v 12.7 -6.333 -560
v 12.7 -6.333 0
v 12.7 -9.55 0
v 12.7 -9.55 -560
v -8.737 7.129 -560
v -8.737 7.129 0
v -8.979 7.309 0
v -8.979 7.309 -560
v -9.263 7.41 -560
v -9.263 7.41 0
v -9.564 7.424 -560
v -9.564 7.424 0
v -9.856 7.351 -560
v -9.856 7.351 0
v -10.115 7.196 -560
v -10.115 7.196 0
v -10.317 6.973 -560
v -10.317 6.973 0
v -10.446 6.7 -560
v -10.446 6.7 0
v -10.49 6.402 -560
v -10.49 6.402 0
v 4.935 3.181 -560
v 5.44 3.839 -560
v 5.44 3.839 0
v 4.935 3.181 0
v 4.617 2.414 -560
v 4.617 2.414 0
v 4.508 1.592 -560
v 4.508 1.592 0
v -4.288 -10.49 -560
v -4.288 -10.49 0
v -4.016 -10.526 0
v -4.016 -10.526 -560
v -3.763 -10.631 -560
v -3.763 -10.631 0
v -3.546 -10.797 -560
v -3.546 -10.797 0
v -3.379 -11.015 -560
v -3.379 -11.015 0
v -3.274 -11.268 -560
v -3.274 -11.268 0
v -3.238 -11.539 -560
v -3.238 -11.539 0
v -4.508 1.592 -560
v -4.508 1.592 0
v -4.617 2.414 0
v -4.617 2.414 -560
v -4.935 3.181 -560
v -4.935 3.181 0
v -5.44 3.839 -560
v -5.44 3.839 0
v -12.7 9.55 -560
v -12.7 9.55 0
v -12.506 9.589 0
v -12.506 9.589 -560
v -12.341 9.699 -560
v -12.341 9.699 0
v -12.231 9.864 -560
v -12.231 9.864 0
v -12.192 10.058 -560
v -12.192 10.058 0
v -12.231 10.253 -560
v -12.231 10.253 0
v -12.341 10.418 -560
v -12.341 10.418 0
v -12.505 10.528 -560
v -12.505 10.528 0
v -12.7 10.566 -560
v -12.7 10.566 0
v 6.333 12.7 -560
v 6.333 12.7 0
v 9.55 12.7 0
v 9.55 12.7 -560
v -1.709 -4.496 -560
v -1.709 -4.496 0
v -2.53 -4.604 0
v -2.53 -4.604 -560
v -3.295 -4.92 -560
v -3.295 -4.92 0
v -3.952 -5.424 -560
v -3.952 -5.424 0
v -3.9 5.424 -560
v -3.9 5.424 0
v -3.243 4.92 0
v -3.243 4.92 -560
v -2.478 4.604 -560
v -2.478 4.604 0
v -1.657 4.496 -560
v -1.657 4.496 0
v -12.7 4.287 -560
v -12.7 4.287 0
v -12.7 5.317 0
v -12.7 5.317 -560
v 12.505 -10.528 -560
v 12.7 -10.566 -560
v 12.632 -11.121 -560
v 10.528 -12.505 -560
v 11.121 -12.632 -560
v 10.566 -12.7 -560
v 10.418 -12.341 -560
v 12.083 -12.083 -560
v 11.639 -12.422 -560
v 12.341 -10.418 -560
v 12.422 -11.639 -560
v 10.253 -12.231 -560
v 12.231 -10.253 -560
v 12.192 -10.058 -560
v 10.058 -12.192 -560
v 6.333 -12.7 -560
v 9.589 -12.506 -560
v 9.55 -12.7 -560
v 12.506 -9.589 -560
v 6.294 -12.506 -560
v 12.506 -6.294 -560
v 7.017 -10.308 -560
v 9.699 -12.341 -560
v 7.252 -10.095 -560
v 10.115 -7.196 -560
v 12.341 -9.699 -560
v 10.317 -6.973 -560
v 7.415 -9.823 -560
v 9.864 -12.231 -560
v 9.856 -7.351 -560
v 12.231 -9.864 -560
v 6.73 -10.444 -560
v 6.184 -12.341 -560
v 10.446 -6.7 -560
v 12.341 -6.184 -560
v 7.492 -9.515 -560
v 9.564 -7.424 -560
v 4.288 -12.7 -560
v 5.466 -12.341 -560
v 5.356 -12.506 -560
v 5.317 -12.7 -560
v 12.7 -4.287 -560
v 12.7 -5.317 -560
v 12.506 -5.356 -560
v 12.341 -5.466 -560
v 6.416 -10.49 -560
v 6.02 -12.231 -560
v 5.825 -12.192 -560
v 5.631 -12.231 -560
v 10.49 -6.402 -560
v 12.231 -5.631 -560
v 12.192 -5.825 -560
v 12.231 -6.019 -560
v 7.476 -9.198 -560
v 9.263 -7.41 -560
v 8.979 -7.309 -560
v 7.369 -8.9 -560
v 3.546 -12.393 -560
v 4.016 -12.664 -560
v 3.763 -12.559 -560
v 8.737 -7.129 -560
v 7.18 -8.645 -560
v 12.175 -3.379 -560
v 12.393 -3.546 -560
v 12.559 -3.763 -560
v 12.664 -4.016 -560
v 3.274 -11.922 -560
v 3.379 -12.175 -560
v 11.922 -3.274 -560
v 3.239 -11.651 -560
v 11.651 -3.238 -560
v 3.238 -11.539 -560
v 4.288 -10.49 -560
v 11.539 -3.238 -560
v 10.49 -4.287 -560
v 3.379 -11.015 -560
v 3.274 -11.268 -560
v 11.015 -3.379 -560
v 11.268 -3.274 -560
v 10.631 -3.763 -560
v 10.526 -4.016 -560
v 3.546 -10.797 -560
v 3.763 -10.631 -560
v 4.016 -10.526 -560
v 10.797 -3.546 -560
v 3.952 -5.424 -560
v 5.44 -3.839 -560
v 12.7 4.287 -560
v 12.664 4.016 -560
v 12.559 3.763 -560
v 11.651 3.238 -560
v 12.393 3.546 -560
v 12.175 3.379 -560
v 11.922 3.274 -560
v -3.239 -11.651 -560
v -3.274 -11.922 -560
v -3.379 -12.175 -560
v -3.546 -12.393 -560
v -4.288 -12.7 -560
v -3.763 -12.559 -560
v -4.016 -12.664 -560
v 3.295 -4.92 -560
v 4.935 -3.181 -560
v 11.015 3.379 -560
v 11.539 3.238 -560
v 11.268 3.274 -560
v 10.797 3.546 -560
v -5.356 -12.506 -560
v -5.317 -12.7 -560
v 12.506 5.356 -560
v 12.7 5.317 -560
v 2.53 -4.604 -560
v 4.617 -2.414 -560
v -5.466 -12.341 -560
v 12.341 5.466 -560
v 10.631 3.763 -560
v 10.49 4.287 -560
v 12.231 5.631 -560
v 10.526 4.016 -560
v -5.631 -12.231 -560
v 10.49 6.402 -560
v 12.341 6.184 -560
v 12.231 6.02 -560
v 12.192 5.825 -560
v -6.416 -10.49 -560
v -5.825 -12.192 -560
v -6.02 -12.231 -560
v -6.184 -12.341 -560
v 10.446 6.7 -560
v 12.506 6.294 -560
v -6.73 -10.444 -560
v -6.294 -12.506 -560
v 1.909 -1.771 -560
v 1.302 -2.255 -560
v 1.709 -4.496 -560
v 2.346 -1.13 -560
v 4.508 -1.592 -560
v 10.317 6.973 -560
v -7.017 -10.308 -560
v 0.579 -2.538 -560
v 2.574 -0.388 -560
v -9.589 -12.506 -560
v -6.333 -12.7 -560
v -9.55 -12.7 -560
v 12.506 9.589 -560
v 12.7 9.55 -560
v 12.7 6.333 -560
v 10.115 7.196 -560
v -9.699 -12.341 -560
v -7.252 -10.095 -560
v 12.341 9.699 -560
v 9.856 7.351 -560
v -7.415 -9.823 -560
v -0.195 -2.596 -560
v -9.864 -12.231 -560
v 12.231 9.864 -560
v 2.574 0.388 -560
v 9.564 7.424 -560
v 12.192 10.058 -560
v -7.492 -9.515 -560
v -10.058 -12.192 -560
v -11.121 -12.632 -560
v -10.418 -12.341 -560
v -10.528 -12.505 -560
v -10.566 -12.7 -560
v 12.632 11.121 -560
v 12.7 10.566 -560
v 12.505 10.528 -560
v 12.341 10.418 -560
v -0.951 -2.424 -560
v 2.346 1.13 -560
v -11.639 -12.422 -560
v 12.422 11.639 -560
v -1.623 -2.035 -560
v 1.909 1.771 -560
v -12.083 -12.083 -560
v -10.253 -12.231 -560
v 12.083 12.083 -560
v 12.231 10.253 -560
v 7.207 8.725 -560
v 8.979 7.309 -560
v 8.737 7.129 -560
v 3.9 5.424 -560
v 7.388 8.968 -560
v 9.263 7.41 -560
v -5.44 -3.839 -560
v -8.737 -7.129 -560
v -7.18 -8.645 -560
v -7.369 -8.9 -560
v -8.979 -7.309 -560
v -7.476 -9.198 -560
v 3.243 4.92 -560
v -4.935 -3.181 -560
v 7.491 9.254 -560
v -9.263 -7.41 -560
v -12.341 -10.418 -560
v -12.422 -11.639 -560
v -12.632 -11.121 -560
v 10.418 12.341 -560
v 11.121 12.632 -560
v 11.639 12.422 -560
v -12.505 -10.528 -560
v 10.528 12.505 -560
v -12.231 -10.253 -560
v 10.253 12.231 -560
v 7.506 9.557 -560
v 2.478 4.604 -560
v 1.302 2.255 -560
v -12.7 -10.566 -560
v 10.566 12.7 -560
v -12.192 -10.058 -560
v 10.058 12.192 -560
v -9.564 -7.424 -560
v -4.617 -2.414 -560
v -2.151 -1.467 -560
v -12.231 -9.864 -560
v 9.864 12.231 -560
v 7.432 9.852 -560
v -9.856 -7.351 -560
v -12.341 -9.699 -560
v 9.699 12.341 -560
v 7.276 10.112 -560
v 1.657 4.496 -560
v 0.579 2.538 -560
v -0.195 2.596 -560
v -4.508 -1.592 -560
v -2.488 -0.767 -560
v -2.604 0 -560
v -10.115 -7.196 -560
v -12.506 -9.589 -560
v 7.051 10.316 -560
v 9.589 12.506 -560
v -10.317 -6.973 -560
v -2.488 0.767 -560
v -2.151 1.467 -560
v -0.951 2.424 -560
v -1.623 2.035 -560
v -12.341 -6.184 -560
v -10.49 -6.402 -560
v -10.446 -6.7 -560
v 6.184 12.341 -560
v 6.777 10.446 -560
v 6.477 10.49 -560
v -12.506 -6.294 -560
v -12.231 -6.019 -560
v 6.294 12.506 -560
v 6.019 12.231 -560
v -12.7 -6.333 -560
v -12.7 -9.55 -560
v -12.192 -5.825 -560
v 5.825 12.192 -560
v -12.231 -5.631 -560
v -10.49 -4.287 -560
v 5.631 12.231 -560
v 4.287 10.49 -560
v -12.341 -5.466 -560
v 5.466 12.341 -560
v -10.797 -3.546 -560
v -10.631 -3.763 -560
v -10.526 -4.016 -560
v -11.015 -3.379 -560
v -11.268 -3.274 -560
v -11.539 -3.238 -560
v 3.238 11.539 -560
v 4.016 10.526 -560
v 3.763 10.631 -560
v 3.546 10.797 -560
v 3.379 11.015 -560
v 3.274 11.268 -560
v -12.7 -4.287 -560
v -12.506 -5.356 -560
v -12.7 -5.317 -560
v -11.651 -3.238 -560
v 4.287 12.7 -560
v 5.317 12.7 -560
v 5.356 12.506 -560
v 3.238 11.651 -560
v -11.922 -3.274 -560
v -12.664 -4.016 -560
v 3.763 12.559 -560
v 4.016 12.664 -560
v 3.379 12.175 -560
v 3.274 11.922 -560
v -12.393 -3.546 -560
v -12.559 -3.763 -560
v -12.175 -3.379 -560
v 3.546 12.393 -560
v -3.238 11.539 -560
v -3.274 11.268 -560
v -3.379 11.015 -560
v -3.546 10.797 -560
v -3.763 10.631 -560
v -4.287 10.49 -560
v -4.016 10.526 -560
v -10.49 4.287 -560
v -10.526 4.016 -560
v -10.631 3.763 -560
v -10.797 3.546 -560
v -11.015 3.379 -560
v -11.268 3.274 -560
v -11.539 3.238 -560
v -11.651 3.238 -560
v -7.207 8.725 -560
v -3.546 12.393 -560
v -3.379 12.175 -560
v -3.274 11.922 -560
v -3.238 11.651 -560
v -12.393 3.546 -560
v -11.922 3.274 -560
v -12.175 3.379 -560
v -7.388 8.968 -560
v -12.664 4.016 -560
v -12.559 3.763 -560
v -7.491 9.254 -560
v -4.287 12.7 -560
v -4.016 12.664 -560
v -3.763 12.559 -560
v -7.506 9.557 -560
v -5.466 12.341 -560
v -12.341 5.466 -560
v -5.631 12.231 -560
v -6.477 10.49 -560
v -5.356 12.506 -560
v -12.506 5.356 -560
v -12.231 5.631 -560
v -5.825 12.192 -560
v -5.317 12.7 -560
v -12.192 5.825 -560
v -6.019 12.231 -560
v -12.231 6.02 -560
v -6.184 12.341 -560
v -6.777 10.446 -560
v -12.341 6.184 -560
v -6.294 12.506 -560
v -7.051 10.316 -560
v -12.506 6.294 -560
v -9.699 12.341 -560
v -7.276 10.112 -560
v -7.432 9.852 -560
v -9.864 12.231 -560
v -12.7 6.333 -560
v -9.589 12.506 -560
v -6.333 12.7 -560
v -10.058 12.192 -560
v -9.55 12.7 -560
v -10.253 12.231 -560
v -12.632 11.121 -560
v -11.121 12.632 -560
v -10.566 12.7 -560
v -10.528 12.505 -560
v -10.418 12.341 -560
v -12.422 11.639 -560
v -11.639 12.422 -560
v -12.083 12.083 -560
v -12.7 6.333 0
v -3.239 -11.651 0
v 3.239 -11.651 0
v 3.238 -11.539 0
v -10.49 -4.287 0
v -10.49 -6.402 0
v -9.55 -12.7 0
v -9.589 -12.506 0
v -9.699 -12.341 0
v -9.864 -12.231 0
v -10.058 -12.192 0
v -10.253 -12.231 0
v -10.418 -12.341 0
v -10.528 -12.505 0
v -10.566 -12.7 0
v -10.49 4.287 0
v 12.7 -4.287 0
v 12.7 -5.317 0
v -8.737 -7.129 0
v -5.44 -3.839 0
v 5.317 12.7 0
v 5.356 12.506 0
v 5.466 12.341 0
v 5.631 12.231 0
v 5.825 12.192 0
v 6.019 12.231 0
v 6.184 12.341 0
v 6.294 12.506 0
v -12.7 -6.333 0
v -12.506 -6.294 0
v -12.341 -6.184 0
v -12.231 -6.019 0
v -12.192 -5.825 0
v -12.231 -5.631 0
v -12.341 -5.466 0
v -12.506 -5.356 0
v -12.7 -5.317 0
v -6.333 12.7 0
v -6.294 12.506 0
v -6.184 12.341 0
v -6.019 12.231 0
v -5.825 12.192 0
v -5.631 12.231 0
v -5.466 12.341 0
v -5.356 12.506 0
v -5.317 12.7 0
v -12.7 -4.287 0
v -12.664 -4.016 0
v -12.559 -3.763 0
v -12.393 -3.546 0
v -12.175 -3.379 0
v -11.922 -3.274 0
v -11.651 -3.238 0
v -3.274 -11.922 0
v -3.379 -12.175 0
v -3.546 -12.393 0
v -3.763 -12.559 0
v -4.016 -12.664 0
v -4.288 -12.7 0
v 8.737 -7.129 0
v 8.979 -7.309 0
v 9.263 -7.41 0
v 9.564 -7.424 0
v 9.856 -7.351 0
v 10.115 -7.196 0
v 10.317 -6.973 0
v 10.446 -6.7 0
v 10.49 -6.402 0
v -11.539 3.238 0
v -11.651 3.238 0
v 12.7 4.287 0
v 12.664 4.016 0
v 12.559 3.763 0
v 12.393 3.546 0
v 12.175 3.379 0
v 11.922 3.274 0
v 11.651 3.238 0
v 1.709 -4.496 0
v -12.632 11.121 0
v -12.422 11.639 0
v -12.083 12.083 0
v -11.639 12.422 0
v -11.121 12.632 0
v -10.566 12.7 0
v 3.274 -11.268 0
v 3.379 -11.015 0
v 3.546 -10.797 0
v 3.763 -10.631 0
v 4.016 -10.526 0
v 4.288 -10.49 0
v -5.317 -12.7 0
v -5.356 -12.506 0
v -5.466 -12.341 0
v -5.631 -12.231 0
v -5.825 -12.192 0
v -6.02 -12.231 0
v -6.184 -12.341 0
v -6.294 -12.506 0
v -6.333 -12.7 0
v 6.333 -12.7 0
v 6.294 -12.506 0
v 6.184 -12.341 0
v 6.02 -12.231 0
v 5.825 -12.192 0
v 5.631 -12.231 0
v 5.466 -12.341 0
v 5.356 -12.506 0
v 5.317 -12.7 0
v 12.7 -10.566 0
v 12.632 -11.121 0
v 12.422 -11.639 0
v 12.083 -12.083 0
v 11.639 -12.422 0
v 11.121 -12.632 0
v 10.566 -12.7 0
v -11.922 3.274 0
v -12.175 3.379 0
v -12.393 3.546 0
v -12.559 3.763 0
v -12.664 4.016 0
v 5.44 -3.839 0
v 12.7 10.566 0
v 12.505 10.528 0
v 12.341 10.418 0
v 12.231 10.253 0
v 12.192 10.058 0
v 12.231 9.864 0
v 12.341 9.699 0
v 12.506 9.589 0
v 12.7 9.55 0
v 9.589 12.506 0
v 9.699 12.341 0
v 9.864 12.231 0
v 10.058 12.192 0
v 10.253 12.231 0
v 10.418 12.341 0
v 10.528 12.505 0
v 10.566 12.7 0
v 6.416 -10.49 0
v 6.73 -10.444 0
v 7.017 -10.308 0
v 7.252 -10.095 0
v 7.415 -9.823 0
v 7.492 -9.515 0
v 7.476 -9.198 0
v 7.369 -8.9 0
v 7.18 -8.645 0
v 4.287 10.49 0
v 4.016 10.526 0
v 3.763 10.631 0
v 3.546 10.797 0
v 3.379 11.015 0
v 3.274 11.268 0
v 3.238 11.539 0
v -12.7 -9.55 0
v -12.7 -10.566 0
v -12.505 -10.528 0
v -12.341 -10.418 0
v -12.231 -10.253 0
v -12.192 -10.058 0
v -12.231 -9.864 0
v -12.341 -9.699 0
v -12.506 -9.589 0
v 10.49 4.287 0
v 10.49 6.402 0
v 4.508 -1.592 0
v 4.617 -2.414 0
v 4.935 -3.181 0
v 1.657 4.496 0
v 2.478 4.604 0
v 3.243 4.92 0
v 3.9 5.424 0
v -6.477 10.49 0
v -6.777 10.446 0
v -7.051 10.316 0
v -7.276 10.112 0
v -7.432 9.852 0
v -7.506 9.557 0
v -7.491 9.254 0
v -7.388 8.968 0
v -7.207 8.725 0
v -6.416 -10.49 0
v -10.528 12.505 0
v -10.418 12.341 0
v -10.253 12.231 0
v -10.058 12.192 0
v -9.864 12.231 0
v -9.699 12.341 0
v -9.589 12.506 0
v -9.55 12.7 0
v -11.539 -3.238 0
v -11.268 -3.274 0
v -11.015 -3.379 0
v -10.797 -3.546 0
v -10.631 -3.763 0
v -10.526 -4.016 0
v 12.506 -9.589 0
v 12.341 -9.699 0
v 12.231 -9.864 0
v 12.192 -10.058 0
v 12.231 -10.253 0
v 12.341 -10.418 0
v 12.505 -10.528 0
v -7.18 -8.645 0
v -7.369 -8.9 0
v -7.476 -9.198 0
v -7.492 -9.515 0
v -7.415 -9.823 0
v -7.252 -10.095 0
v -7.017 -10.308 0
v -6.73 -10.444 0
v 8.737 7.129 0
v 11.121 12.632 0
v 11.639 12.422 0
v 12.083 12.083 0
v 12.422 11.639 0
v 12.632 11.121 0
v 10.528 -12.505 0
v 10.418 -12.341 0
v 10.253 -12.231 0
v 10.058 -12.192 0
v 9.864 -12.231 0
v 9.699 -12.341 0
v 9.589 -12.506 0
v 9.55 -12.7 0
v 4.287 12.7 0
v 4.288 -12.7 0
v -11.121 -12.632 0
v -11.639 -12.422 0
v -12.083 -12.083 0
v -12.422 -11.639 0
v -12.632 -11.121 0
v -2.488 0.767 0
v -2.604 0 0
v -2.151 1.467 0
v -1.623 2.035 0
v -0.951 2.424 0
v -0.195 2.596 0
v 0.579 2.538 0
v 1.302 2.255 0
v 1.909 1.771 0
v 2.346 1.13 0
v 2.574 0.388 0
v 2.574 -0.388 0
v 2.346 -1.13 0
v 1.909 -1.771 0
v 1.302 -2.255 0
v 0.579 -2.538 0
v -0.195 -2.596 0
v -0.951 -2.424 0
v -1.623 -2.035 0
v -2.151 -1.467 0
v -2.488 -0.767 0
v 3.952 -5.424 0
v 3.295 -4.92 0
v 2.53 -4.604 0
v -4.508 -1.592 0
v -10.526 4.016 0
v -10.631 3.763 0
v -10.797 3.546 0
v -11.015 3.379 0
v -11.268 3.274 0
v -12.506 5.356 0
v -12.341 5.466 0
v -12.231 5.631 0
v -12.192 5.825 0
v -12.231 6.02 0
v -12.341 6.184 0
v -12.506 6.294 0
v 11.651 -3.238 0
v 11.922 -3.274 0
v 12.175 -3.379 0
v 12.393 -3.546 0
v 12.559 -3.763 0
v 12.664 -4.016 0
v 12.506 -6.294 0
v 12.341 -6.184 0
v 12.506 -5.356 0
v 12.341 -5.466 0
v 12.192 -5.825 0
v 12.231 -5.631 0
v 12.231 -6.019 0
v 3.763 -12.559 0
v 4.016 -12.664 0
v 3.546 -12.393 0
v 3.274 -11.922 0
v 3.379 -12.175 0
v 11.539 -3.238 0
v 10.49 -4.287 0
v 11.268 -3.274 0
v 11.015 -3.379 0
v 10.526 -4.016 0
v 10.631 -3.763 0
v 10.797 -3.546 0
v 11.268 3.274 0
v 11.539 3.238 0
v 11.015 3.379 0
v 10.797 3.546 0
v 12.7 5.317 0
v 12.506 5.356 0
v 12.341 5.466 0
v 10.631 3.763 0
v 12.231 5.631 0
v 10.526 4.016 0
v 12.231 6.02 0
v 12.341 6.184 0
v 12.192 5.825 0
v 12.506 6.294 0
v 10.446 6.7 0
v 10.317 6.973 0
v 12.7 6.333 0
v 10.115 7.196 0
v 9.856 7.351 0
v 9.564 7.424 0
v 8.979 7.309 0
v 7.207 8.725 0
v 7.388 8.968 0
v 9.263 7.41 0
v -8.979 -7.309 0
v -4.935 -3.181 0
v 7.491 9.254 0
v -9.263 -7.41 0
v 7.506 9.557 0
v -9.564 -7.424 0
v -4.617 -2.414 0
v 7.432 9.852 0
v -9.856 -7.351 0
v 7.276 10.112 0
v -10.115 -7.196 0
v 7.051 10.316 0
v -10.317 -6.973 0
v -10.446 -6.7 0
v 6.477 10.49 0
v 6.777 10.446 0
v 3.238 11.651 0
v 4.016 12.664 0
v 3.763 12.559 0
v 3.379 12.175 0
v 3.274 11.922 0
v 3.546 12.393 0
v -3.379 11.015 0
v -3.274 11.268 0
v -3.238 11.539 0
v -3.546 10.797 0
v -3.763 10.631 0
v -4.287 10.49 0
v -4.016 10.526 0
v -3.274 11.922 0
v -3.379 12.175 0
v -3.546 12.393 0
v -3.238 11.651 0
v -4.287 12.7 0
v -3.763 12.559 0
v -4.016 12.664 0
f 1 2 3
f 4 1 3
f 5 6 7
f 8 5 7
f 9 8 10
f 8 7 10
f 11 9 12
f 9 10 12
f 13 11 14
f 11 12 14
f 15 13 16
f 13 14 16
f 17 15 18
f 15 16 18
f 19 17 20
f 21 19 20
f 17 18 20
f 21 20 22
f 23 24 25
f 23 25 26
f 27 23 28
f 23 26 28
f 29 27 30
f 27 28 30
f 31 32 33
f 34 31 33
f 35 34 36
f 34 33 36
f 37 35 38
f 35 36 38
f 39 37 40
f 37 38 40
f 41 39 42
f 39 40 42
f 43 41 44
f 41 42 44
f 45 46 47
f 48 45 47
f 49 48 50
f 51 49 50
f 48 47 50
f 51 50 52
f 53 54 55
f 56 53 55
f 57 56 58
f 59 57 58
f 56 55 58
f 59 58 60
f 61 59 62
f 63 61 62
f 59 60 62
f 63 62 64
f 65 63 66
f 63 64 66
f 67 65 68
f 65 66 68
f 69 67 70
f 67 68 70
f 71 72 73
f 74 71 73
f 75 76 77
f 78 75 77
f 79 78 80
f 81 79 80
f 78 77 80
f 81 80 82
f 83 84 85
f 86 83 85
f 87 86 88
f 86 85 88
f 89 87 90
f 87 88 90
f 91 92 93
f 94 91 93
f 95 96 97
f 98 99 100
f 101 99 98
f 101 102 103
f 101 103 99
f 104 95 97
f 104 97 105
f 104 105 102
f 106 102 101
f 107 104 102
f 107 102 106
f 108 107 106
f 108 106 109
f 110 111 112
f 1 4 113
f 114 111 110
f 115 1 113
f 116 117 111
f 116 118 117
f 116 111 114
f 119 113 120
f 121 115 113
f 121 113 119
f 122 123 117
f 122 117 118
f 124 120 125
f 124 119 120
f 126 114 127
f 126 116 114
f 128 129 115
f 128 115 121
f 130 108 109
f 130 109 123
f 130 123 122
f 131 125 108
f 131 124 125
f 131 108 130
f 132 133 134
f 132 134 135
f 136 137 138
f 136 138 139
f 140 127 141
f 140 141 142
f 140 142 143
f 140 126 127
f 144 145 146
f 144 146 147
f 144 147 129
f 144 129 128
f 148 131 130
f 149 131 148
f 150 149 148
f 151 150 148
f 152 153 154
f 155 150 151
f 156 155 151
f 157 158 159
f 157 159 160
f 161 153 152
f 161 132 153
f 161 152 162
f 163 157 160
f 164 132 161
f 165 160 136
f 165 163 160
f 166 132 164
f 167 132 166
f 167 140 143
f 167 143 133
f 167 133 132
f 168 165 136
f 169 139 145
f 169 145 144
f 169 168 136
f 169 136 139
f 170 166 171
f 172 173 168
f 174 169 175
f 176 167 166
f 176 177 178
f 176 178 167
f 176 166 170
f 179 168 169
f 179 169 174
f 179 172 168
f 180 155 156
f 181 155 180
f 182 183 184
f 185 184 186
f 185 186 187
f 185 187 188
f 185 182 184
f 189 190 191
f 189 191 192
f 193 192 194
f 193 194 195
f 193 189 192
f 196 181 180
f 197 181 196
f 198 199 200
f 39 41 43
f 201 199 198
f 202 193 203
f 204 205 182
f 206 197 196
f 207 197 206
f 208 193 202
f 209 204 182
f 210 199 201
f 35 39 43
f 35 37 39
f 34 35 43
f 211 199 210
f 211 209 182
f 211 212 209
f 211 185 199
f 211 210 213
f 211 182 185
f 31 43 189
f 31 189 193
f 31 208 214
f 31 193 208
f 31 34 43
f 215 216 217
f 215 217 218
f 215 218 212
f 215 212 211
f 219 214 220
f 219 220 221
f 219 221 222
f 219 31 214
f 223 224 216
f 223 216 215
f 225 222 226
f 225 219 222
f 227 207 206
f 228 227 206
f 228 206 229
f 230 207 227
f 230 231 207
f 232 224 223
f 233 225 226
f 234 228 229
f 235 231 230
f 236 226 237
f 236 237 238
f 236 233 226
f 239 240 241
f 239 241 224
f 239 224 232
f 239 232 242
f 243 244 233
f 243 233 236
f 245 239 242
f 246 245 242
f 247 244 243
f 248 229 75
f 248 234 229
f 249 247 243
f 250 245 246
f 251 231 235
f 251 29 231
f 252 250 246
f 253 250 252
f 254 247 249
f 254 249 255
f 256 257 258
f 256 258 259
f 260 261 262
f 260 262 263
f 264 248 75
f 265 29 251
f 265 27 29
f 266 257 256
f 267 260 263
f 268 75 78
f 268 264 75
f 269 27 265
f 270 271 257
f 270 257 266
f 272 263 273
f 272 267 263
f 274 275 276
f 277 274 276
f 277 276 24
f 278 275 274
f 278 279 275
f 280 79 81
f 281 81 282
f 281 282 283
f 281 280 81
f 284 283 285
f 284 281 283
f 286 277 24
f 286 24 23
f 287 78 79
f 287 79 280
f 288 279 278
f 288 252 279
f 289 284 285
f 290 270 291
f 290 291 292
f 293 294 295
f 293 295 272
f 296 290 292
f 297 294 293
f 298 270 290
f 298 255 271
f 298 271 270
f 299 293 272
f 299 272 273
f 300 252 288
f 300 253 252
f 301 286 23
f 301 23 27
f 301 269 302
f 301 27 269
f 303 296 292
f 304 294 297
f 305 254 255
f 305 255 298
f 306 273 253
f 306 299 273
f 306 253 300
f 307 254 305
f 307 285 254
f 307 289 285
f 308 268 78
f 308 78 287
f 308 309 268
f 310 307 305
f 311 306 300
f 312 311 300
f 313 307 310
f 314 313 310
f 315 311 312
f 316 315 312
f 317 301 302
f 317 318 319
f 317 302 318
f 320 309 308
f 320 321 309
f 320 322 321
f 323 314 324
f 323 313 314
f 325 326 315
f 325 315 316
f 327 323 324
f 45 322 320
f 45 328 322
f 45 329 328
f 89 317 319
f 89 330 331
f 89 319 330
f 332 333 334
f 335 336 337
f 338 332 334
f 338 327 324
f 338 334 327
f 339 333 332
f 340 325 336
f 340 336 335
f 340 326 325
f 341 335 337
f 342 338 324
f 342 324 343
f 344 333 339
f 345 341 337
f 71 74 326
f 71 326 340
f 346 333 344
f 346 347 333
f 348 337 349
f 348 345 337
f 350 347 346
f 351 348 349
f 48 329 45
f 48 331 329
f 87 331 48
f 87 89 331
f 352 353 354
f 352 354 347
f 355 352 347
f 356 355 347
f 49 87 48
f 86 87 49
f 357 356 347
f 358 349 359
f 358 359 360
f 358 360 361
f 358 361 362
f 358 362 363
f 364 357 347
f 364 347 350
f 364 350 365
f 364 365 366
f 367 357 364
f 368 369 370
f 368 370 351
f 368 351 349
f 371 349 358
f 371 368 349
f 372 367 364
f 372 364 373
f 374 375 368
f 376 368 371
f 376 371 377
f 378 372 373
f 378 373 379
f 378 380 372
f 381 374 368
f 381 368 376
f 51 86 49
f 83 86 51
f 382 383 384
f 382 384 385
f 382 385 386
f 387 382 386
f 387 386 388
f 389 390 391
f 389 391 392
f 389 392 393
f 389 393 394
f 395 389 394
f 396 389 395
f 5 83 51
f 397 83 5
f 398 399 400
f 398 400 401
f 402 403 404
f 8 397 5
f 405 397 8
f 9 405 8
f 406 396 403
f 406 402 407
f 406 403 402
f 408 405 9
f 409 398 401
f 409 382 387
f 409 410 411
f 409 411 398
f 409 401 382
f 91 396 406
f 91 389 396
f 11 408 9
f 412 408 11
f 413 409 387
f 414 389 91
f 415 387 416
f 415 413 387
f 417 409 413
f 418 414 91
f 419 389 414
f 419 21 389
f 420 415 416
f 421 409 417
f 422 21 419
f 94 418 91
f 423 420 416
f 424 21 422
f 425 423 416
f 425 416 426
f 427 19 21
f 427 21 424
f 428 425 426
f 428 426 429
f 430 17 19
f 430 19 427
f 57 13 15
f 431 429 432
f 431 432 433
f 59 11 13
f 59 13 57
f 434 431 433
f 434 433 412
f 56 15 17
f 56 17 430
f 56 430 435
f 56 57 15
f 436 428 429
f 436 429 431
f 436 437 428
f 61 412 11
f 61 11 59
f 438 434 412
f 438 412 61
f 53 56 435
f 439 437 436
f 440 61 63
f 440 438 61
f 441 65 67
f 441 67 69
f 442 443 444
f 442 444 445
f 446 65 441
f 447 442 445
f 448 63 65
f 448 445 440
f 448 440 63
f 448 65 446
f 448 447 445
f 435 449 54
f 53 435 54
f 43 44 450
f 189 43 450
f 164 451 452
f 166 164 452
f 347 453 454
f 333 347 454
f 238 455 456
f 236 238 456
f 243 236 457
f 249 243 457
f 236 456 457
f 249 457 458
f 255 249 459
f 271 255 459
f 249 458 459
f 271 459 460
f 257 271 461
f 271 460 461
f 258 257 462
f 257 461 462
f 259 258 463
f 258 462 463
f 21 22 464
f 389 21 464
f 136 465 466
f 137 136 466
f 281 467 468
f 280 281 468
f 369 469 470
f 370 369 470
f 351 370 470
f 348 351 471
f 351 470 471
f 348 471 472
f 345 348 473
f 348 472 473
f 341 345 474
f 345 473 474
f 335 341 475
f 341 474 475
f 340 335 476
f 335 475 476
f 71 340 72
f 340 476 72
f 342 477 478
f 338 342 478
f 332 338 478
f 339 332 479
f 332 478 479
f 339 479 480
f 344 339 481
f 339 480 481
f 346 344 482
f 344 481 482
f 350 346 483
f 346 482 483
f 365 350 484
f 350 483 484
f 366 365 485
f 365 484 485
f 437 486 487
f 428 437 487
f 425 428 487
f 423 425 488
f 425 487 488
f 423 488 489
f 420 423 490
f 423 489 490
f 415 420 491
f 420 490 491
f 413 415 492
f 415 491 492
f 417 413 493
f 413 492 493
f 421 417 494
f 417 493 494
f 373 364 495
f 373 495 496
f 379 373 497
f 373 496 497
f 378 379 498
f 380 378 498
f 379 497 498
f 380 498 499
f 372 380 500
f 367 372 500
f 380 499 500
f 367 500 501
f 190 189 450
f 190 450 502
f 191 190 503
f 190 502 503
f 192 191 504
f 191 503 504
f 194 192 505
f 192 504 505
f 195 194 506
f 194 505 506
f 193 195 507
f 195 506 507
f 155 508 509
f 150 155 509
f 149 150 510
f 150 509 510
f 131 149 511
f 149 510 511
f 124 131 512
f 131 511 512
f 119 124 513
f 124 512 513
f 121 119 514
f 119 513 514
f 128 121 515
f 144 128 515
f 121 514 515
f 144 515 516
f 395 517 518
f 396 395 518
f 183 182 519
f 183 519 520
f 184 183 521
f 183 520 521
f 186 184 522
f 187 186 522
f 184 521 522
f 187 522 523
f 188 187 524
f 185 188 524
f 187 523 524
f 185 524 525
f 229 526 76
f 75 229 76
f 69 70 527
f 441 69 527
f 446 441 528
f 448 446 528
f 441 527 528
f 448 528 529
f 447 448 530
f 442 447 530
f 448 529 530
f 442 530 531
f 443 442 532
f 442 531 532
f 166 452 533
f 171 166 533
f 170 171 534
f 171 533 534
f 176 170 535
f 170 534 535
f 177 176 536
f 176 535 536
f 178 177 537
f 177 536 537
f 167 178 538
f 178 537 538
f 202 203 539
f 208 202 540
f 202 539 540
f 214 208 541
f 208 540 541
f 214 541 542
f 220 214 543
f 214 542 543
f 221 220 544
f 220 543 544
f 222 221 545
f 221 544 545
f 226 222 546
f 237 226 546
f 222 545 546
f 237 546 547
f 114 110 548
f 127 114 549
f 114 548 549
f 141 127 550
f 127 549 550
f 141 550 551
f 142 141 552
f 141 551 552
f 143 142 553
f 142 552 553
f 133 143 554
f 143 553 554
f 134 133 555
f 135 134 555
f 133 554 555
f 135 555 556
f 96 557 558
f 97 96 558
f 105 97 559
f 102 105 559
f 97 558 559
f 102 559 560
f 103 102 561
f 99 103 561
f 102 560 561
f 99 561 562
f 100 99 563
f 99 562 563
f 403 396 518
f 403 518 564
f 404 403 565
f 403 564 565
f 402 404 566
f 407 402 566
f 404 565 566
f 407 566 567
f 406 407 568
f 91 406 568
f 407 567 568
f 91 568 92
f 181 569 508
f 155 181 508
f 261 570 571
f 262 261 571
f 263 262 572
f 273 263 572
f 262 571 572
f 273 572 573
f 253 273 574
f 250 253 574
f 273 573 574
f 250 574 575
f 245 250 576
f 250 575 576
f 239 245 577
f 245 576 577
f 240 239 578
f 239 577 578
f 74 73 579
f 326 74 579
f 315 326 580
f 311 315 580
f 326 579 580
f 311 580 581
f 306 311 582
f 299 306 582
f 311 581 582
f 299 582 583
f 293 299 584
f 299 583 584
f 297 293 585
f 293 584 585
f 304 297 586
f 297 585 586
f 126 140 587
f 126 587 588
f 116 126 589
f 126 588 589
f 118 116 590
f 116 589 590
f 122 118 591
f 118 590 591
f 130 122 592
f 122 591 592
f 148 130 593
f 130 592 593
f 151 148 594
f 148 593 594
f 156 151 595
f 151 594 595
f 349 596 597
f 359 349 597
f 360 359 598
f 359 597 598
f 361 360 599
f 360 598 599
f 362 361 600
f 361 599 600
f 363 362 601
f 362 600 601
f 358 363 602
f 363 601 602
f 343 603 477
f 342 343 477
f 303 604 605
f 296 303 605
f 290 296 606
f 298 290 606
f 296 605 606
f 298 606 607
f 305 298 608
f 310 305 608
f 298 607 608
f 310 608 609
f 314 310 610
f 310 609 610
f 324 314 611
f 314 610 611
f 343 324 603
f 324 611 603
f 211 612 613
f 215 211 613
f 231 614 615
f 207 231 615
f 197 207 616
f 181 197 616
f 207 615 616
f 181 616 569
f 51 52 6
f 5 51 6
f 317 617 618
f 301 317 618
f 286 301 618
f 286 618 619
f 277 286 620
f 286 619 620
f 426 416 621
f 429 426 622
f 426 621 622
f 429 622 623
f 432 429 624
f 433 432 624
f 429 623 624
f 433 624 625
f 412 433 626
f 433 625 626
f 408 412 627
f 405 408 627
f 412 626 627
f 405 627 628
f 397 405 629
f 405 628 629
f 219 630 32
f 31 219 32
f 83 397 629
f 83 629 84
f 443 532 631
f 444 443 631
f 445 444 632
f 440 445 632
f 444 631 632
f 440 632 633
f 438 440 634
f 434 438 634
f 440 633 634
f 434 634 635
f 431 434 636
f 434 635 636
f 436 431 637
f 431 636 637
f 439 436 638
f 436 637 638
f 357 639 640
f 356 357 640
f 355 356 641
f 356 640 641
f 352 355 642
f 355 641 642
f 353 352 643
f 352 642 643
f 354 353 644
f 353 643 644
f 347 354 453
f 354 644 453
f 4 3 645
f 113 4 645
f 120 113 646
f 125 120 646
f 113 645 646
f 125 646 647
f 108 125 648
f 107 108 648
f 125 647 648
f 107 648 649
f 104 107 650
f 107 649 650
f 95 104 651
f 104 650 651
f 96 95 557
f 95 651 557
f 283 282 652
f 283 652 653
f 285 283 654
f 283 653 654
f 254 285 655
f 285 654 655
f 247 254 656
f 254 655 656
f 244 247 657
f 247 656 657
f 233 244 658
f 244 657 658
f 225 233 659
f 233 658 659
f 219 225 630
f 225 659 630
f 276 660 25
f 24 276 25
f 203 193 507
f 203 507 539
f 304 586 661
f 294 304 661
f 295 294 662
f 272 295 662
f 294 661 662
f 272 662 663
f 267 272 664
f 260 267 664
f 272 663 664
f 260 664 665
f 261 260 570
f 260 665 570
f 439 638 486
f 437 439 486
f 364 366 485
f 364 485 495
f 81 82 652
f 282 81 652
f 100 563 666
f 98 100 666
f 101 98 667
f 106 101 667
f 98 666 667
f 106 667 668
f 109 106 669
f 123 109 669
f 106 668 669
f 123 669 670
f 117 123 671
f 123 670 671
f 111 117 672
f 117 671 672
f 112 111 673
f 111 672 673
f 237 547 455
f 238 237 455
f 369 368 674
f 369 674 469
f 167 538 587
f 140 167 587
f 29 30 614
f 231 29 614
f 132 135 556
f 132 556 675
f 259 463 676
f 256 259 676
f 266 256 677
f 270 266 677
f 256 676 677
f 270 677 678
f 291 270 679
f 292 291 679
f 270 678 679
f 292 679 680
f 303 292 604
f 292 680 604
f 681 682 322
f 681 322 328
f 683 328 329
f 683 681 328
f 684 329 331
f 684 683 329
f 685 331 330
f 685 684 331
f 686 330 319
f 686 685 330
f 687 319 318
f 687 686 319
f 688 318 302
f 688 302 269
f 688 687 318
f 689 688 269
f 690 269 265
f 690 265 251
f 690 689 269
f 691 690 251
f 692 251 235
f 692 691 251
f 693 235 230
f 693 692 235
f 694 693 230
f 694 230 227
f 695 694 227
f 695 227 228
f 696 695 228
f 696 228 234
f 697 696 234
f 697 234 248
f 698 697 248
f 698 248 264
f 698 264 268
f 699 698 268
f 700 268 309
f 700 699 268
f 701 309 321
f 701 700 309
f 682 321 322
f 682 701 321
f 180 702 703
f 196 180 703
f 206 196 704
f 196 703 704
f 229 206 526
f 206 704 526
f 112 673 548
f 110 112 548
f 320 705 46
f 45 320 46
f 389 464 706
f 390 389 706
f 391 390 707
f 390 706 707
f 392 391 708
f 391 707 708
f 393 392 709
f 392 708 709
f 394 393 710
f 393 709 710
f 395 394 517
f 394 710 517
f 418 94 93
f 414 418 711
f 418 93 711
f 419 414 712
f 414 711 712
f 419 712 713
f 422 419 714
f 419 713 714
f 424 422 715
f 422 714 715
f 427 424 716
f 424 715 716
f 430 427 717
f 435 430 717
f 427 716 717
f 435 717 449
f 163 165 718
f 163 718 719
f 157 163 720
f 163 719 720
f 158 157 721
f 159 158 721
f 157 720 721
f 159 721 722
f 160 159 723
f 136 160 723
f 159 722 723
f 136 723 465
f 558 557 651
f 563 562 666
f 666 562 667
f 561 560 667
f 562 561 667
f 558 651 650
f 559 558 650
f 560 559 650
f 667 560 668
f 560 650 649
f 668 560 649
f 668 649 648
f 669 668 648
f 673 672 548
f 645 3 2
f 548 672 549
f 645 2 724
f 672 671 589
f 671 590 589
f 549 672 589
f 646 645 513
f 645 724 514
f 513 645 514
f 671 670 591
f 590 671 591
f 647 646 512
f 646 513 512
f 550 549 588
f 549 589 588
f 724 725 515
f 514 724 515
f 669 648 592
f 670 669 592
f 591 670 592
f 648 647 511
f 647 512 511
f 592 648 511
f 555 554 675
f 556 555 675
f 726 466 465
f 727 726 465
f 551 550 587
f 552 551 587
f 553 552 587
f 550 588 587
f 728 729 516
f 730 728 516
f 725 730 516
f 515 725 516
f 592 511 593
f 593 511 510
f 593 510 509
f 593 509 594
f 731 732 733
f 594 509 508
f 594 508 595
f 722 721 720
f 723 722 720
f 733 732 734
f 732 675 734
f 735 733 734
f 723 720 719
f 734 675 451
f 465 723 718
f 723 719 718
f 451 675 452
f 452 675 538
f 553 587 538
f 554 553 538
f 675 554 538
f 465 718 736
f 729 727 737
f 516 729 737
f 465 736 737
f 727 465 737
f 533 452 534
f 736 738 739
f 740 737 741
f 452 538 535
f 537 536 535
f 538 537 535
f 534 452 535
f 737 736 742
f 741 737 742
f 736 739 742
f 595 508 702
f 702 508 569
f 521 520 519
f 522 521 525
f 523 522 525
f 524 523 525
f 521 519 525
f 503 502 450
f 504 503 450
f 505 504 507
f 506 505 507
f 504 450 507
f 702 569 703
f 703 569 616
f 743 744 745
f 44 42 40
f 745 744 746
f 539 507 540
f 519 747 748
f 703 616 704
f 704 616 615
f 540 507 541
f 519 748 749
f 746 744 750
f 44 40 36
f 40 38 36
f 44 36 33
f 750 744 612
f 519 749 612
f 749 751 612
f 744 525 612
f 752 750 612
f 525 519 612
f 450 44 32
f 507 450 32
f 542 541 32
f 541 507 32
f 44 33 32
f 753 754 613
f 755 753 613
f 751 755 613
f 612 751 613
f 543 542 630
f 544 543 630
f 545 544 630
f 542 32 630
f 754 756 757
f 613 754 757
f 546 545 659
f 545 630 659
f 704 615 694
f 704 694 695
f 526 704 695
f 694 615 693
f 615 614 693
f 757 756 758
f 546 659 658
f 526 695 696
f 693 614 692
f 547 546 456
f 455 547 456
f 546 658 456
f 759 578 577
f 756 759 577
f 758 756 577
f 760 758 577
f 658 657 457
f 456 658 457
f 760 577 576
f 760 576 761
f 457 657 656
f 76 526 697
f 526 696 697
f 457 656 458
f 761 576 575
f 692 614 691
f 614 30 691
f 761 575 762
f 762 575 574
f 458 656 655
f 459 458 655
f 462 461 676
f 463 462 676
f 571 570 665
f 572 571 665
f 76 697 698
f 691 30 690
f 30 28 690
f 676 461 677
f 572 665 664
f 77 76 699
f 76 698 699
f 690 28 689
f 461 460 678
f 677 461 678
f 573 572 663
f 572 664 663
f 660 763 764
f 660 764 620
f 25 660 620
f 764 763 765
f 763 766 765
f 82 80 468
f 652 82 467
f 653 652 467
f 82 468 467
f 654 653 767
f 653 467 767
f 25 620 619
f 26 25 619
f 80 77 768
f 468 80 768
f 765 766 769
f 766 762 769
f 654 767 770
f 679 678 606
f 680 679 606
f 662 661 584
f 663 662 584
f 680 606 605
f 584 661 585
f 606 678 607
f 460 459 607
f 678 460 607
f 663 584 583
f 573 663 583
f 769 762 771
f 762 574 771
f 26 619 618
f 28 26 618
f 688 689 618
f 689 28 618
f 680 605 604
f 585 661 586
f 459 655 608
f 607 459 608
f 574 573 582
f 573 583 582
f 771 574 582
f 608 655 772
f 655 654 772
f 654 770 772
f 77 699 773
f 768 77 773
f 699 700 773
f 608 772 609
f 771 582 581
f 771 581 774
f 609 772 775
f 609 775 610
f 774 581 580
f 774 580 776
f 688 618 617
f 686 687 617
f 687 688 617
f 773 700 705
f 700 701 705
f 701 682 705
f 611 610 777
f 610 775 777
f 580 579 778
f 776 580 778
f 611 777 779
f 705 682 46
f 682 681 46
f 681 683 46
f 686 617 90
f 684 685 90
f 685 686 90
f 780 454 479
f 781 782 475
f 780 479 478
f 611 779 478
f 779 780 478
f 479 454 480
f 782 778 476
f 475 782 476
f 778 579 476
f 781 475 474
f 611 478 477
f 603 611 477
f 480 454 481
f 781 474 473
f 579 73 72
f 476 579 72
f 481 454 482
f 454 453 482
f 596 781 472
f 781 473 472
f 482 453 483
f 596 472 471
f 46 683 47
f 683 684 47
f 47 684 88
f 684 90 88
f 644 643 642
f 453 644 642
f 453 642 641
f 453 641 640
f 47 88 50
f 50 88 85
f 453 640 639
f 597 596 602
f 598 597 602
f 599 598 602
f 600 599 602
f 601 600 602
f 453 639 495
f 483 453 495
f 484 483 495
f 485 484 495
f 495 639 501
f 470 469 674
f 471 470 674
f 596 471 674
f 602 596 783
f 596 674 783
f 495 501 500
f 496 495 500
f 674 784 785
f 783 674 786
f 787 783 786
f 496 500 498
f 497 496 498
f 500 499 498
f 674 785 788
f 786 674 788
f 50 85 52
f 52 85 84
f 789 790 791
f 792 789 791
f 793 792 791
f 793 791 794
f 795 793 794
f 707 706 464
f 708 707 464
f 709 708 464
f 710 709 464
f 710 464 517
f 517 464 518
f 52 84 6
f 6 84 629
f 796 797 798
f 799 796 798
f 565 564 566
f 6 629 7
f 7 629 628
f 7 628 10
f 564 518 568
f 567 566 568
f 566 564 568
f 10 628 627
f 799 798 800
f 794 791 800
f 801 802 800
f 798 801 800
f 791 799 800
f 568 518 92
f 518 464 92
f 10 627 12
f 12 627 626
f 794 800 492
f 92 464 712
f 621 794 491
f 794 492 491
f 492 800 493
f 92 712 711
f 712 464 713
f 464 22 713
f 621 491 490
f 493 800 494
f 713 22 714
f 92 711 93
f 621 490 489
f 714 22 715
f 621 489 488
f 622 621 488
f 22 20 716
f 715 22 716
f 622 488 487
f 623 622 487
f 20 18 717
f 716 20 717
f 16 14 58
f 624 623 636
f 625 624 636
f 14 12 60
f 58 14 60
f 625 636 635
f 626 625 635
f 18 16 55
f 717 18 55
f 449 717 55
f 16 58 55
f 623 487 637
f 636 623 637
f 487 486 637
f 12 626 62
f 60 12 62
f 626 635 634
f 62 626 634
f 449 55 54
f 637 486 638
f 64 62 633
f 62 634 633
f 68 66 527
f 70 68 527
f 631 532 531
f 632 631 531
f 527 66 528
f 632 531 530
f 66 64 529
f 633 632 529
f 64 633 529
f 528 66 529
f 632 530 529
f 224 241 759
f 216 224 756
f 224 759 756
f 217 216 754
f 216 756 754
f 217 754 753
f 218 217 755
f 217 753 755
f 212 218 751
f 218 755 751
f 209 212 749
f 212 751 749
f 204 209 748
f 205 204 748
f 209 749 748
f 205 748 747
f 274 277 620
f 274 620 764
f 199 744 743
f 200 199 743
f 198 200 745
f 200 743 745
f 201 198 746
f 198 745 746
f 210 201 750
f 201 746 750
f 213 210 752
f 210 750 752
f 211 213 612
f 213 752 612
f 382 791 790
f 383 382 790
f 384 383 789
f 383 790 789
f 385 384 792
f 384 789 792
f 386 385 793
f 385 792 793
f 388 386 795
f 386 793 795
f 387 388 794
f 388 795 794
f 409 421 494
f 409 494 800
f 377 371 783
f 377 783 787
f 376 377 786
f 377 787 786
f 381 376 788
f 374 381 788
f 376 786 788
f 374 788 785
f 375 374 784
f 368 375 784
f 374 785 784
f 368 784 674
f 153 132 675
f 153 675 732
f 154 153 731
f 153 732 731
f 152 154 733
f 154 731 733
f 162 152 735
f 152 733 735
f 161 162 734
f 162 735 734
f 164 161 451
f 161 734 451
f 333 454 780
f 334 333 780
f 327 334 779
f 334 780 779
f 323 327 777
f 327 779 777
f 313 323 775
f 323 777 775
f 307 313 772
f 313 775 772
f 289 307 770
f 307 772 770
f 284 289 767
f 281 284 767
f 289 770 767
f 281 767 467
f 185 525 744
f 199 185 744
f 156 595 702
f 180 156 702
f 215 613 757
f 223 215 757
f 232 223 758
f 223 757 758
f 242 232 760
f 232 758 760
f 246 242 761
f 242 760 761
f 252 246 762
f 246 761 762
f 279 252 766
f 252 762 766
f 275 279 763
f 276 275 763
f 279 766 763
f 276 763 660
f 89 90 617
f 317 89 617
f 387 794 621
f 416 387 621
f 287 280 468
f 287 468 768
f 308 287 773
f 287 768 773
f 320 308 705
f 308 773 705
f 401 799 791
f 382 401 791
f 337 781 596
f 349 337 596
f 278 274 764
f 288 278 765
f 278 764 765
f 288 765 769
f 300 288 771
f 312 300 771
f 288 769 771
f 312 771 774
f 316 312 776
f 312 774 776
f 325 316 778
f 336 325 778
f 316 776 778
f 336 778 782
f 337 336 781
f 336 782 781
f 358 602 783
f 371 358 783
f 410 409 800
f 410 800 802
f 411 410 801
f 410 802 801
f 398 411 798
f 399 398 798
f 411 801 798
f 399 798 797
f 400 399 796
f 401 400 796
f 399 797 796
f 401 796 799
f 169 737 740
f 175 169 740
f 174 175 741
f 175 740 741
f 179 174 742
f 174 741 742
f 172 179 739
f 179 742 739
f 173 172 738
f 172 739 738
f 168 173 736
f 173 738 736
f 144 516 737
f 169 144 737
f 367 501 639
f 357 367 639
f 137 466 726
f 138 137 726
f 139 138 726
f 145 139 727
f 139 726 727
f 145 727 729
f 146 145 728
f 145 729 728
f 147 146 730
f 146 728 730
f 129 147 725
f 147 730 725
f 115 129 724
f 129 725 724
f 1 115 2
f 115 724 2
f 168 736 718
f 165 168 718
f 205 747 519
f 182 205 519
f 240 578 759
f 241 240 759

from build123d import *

# Parameters (mm, degrees)
SKETCH16_R                                 = 2.6035
IMPERIAL_AL_EXTRUSION_1010_PROFILE_1_DEPTH = 560


with BuildPart() as part:
    # Sketch16 → Imperial al extrusion 1010 PROFILE(1) (new body)
    with BuildSketch(Plane(origin=(0, 0, 0), x_dir=(-1, 0, 0), z_dir=(0, 0, -1))):
        with BuildLine():
            Line((-1.709253557, -4.4958), (1.709253557, -4.4958))
            ThreePointArc((1.709253557, -4.4958), (2.922935876, -4.736928798), (3.95226937, -5.423689619))
            Line((3.95226937, -5.423689619), (7.179652728, -8.645192207))
            ThreePointArc((7.179652728, -8.645192207), (7.414733441, -9.822812921), (6.41641086, -10.4902))
            Line((6.41641086, -10.4902), (4.28752, -10.4902))
            ThreePointArc((4.28752, -10.4902), (3.545750844, -10.797450844), (3.2385, -11.53922))
            Line((3.2385, -11.53922), (3.2385, -11.65098))
            ThreePointArc((3.2385, -11.65098), (3.545750844, -12.392749156), (4.28752, -12.7))
            Line((4.28752, -12.7), (5.3171344, -12.7))
            ThreePointArc((5.3171344, -12.7), (5.8251344, -12.192), (6.3331344, -12.7))
            Line((6.3331344, -12.7), (9.5504, -12.7))
            ThreePointArc((9.5504, -12.7), (10.058323491, -12.192000006), (10.566399977, -12.699846982))
            ThreePointArc((10.566399977, -12.699846982), (12.082522516, -12.082522516), (12.699846982, -10.566399977))
            ThreePointArc((12.699846982, -10.566399977), (12.192000006, -10.058323491), (12.7, -9.5504))
            Line((12.7, -9.5504), (12.7, -6.3330836))
            ThreePointArc((12.7, -6.3330836), (12.192, -5.8250836), (12.7, -5.3170836))
            Line((12.7, -5.3170836), (12.7, -4.287470133))
            ThreePointArc((12.7, -4.287470133), (12.392749156, -3.545700977), (11.65098, -3.238450133))
            Line((11.65098, -3.238450133), (11.53922, -3.238450133))
            ThreePointArc((11.53922, -3.238450133), (10.797450844, -3.545700977), (10.4902, -4.287470133))
            Line((10.4902, -4.287470133), (10.4902, -6.402089023))
            ThreePointArc((10.4902, -6.402089023), (9.856394933, -7.351113629), (8.736962546, -7.129240479))
            Line((8.736962546, -7.129240479), (5.440484187, -3.838768792))
            ThreePointArc((5.440484187, -3.838768792), (4.75073678, -2.808015636), (4.5085, -1.591658411))
            Line((4.5085, -1.591658411), (4.5085, 1.591658411))
            ThreePointArc((4.5085, 1.591658411), (4.75073678, 2.808015636), (5.440484187, 3.838768792))
            Line((5.440484187, 3.838768792), (8.736962546, 7.129240479))
            ThreePointArc((8.736962546, 7.129240479), (9.856394933, 7.351113629), (10.4902, 6.402089023))
            Line((10.4902, 6.402089023), (10.4902, 4.287470133))
            ThreePointArc((10.4902, 4.287470133), (10.797450844, 3.545700977), (11.53922, 3.238450133))
            Line((11.53922, 3.238450133), (11.65098, 3.238450133))
            ThreePointArc((11.65098, 3.238450133), (12.392749156, 3.545700977), (12.7, 4.287470133))
            Line((12.7, 4.287470133), (12.7, 5.3171344))
            ThreePointArc((12.7, 5.3171344), (12.192, 5.8251344), (12.7, 6.3331344))
            Line((12.7, 6.3331344), (12.7, 9.5504))
            ThreePointArc((12.7, 9.5504), (12.192000006, 10.058323491), (12.699846982, 10.566399977))
            ThreePointArc((12.699846982, 10.566399977), (12.082522516, 12.082522516), (10.566399977, 12.699846982))
            ThreePointArc((10.566399977, 12.699846982), (10.058323491, 12.192000006), (9.5504, 12.7))
            Line((9.5504, 12.7), (6.3330836, 12.7))
            ThreePointArc((6.3330836, 12.7), (5.8250836, 12.192), (5.3170836, 12.7))
            Line((5.3170836, 12.7), (4.2874692, 12.7))
            ThreePointArc((4.2874692, 12.7), (3.545700044, 12.392749156), (3.2384492, 11.65098))
            Line((3.2384492, 11.65098), (3.2384492, 11.53922))
            ThreePointArc((3.2384492, 11.53922), (3.545700044, 10.797450844), (4.2874692, 10.4902))
            Line((4.2874692, 10.4902), (6.476774195, 10.4902))
            ThreePointArc((6.476774195, 10.4902), (7.43216212, 9.851515102), (7.207191475, 8.724540082))
            Line((7.207191475, 8.724540082), (3.900315394, 5.423689619))
            ThreePointArc((3.900315394, 5.423689619), (2.8709819, 4.736928798), (1.657299581, 4.4958))
            Line((1.657299581, 4.4958), (-1.657299581, 4.4958))
            ThreePointArc((-1.657299581, 4.4958), (-2.8709819, 4.736928798), (-3.900315394, 5.423689619))
            Line((-3.900315394, 5.423689619), (-7.207191475, 8.724540082))
            ThreePointArc((-7.207191475, 8.724540082), (-7.43216212, 9.851515102), (-6.476774195, 10.4902))
            Line((-6.476774195, 10.4902), (-4.2874692, 10.4902))
            ThreePointArc((-4.2874692, 10.4902), (-3.545700044, 10.797450844), (-3.2384492, 11.53922))
            Line((-3.2384492, 11.53922), (-3.2384492, 11.65098))
            ThreePointArc((-3.2384492, 11.65098), (-3.545700044, 12.392749156), (-4.2874692, 12.7))
            Line((-4.2874692, 12.7), (-5.3170836, 12.7))
            ThreePointArc((-5.3170836, 12.7), (-5.8250836, 12.192), (-6.3330836, 12.7))
            Line((-6.3330836, 12.7), (-9.5504, 12.7))
            ThreePointArc((-9.5504, 12.7), (-10.058323491, 12.192000006), (-10.566399977, 12.699846982))
            ThreePointArc((-10.566399977, 12.699846982), (-12.082522516, 12.082522516), (-12.699846982, 10.566399977))
            ThreePointArc((-12.699846982, 10.566399977), (-12.192000006, 10.058323491), (-12.7, 9.5504))
            Line((-12.7, 9.5504), (-12.7, 6.3331344))
            ThreePointArc((-12.7, 6.3331344), (-12.192, 5.8251344), (-12.7, 5.3171344))
            Line((-12.7, 5.3171344), (-12.7, 4.287470133))
            ThreePointArc((-12.7, 4.287470133), (-12.392749156, 3.545700977), (-11.65098, 3.238450133))
            Line((-11.65098, 3.238450133), (-11.53922, 3.238450133))
            ThreePointArc((-11.53922, 3.238450133), (-10.797450844, 3.545700977), (-10.4902, 4.287470133))
            Line((-10.4902, 4.287470133), (-10.4902, 6.402089023))
            ThreePointArc((-10.4902, 6.402089023), (-9.856394933, 7.351113629), (-8.736962546, 7.129240479))
            Line((-8.736962546, 7.129240479), (-5.440484187, 3.838768792))
            ThreePointArc((-5.440484187, 3.838768792), (-4.75073678, 2.808015636), (-4.5085, 1.591658411))
            Line((-4.5085, 1.591658411), (-4.5085, -1.591658411))
            ThreePointArc((-4.5085, -1.591658411), (-4.75073678, -2.808015636), (-5.440484187, -3.838768792))
            Line((-5.440484187, -3.838768792), (-8.736962546, -7.129240479))
            ThreePointArc((-8.736962546, -7.129240479), (-9.856394933, -7.351113629), (-10.4902, -6.402089023))
            Line((-10.4902, -6.402089023), (-10.4902, -4.287470133))
            ThreePointArc((-10.4902, -4.287470133), (-10.797450844, -3.545700977), (-11.53922, -3.238450133))
            Line((-11.53922, -3.238450133), (-11.65098, -3.238450133))
            ThreePointArc((-11.65098, -3.238450133), (-12.392749156, -3.545700977), (-12.7, -4.287470133))
            Line((-12.7, -4.287470133), (-12.7, -5.3170836))
            ThreePointArc((-12.7, -5.3170836), (-12.192, -5.8250836), (-12.7, -6.3330836))
            Line((-12.7, -6.3330836), (-12.7, -9.5504))
            ThreePointArc((-12.7, -9.5504), (-12.192000006, -10.058323491), (-12.699846982, -10.566399977))
            ThreePointArc((-12.699846982, -10.566399977), (-12.082522516, -12.082522516), (-10.566399977, -12.699846982))
            ThreePointArc((-10.566399977, -12.699846982), (-10.058323491, -12.192000006), (-9.5504, -12.7))
            Line((-9.5504, -12.7), (-6.3331344, -12.7))
            ThreePointArc((-6.3331344, -12.7), (-5.8251344, -12.192), (-5.3171344, -12.7))
            Line((-5.3171344, -12.7), (-4.28752, -12.7))
            ThreePointArc((-4.28752, -12.7), (-3.545750844, -12.392749156), (-3.2385, -11.65098))
            Line((-3.2385, -11.65098), (-3.2385, -11.53922))
            ThreePointArc((-3.2385, -11.53922), (-3.545750844, -10.797450844), (-4.28752, -10.4902))
            Line((-4.28752, -10.4902), (-6.41641086, -10.4902))
            ThreePointArc((-6.41641086, -10.4902), (-7.414733441, -9.822812921), (-7.179652728, -8.645192207))
            Line((-7.179652728, -8.645192207), (-3.95226937, -5.423689619))
            ThreePointArc((-3.95226937, -5.423689619), (-2.922935876, -4.736928798), (-1.709253557, -4.4958))
        make_face()
        Circle(SKETCH16_R, mode=Mode.SUBTRACT)
    extrude(amount=IMPERIAL_AL_EXTRUSION_1010_PROFILE_1_DEPTH)


solid = part.part
